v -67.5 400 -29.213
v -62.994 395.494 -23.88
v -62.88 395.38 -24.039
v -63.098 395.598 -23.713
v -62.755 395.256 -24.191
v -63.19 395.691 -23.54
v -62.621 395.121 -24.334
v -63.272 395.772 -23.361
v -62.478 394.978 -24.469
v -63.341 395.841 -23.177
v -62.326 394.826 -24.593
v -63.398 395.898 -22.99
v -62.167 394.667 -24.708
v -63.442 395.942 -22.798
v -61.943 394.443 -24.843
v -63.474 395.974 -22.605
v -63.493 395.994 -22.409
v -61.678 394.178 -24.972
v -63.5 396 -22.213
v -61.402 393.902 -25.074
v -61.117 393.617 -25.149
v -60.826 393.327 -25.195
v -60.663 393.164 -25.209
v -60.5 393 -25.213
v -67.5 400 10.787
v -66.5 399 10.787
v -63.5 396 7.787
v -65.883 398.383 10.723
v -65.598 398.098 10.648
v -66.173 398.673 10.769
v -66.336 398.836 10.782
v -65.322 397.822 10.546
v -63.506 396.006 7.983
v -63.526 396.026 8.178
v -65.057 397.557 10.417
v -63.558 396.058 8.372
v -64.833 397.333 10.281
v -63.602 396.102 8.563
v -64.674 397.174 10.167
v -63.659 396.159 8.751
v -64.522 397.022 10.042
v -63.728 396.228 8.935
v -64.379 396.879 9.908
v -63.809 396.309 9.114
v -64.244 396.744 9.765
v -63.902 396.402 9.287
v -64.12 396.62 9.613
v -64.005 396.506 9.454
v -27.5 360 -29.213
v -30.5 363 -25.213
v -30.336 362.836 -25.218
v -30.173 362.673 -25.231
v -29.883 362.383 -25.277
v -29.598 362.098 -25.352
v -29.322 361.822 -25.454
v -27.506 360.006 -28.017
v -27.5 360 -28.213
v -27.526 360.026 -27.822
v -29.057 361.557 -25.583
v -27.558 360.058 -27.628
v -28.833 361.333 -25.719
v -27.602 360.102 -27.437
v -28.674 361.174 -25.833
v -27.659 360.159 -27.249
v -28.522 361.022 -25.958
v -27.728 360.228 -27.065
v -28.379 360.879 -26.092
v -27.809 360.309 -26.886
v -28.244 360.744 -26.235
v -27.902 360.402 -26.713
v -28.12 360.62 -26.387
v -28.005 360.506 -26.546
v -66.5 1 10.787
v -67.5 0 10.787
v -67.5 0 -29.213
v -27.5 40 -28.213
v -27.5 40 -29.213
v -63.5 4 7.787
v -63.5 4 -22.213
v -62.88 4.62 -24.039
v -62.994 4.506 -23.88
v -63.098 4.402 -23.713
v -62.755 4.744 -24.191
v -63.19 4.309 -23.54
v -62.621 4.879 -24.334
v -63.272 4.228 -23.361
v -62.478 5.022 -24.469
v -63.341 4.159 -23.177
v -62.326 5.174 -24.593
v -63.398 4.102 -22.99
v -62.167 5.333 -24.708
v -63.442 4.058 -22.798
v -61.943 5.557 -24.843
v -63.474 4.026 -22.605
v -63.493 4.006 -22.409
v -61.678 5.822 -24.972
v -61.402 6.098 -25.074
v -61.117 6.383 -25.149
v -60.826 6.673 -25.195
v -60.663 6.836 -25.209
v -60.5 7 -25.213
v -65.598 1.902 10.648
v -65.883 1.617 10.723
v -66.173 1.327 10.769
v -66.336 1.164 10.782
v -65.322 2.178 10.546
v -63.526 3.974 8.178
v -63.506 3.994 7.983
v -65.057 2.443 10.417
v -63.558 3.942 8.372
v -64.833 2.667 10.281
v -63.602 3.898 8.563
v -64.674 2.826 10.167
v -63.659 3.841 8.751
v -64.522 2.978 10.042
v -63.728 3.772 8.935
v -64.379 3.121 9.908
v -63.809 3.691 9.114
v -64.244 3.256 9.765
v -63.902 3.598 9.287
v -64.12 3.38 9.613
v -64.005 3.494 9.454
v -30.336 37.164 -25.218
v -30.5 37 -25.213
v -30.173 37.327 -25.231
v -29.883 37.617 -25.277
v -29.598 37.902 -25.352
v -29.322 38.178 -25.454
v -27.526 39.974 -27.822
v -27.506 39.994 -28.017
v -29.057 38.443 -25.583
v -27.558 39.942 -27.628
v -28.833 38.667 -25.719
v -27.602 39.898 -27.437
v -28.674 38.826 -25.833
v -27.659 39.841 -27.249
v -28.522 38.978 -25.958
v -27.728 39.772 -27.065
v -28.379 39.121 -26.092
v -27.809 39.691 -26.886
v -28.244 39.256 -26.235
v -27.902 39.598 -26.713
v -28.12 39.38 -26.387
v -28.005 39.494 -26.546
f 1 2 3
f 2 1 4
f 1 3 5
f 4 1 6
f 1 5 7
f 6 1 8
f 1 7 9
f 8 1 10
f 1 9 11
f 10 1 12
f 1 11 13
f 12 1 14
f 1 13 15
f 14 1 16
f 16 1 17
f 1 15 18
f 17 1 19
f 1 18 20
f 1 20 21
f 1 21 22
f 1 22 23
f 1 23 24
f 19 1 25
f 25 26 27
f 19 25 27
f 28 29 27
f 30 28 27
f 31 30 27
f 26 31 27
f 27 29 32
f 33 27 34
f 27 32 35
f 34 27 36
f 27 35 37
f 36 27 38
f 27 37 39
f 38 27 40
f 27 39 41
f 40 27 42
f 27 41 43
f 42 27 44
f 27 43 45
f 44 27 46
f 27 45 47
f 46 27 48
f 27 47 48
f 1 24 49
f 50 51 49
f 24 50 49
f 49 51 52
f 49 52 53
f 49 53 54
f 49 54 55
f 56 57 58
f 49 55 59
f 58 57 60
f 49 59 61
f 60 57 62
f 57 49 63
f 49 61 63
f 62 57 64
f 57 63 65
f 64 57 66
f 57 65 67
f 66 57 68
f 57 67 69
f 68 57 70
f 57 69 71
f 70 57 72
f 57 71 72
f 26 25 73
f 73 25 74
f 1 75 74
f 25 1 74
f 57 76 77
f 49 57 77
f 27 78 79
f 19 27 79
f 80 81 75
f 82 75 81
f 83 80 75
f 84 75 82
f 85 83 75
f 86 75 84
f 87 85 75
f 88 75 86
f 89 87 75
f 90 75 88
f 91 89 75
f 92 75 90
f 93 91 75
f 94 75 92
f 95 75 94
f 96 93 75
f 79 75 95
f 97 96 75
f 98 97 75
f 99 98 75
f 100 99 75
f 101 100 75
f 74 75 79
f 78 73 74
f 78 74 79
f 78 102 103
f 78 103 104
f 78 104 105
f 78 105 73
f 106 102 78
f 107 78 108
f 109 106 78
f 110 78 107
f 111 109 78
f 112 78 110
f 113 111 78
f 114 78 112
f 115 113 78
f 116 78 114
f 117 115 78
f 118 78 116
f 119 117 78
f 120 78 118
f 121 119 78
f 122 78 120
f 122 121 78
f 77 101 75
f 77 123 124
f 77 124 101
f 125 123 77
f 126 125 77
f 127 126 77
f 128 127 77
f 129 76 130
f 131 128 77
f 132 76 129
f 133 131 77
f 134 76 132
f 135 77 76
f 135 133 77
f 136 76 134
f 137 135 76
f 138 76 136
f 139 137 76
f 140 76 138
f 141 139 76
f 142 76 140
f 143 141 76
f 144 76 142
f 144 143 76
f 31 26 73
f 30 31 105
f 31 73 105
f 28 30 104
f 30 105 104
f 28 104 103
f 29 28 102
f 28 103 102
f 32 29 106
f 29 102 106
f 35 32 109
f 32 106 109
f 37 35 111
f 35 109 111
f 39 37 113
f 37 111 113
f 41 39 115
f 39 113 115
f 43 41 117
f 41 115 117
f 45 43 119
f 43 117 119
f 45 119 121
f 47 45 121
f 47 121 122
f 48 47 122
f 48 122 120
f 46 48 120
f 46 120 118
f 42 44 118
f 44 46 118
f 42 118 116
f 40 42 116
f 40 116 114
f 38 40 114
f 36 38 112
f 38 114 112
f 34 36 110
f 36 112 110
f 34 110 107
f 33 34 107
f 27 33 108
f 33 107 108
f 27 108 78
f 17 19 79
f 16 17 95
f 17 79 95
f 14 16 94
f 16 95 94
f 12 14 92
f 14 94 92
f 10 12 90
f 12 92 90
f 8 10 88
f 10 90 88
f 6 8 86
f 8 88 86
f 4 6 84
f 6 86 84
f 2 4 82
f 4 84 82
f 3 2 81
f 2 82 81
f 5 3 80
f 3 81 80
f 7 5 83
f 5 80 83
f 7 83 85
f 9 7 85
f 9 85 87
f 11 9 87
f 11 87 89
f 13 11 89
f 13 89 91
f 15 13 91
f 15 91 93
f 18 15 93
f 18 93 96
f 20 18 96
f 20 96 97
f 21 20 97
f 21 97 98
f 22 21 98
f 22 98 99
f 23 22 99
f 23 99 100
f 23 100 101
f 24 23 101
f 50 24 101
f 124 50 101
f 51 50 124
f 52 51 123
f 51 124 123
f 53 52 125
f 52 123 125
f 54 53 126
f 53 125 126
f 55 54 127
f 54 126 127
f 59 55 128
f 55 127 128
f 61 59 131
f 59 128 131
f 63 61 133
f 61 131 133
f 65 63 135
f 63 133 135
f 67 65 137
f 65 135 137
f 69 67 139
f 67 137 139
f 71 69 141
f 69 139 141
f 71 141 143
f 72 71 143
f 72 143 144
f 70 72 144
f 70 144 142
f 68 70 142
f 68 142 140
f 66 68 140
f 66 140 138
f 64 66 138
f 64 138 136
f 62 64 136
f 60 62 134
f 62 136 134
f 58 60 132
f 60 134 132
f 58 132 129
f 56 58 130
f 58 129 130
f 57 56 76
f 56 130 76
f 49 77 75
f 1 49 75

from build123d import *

# Parameters (mm, degrees)
BOSS_EXTRUDE1_DEPTH     = 400
CUT_EXTRUDE1_DEPTH      = 408.622659747
CUT_EXTRUDE1_DEPTH_BACK = 408.622659747


with BuildPart() as part:
    # Sketch1 → Boss-Extrude1 (new body)
    with BuildSketch(Plane(origin=(0, 0, 0), x_dir=(1, 0, 0), z_dir=(0, 1, 0))):
        with BuildLine():
            Line((-27.499872145, 29.213153277), (-67.499872145, 29.213153277))
            Line((-67.499872145, 29.213153277), (-67.499872145, -10.786846723))
            Line((-67.499872145, -10.786846723), (-66.499872145, -10.786846723))
            ThreePointArc((-66.499872145, -10.786846723), (-64.378551801, -9.908167067), (-63.499872145, -7.786846723))
            Line((-63.499872145, -7.786846723), (-63.499872145, 22.213153277))
            ThreePointArc((-63.499872145, 22.213153277), (-62.621192489, 24.334473621), (-60.499872145, 25.213153277))
            Line((-60.499872145, 25.213153277), (-30.499872145, 25.213153277))
            ThreePointArc((-30.499872145, 25.213153277), (-28.378551801, 26.091832933), (-27.499872145, 28.213153277))
            Line((-27.499872145, 28.213153277), (-27.499872145, 29.213153277))
        make_face()
    extrude(amount=BOSS_EXTRUDE1_DEPTH)

    # Sketch2 → Cut-Extrude1 (cut, two sides: drawn at the far end of the back side and taken through both)
    with BuildSketch(Plane(origin=(0, 0, -29.213153277), x_dir=(-1, 0, 0), z_dir=(0, 0, -1)).offset(-CUT_EXTRUDE1_DEPTH_BACK)):
        Polygon((67.499872145, 0), (27.499872145, 40), (27.499872145, 0), align=None)
        Polygon((27.499872145, 400), (67.499872145, 400), (27.499872145, 360), align=None)
    extrude(amount=CUT_EXTRUDE1_DEPTH + CUT_EXTRUDE1_DEPTH_BACK, mode=Mode.SUBTRACT)


solid = part.part
